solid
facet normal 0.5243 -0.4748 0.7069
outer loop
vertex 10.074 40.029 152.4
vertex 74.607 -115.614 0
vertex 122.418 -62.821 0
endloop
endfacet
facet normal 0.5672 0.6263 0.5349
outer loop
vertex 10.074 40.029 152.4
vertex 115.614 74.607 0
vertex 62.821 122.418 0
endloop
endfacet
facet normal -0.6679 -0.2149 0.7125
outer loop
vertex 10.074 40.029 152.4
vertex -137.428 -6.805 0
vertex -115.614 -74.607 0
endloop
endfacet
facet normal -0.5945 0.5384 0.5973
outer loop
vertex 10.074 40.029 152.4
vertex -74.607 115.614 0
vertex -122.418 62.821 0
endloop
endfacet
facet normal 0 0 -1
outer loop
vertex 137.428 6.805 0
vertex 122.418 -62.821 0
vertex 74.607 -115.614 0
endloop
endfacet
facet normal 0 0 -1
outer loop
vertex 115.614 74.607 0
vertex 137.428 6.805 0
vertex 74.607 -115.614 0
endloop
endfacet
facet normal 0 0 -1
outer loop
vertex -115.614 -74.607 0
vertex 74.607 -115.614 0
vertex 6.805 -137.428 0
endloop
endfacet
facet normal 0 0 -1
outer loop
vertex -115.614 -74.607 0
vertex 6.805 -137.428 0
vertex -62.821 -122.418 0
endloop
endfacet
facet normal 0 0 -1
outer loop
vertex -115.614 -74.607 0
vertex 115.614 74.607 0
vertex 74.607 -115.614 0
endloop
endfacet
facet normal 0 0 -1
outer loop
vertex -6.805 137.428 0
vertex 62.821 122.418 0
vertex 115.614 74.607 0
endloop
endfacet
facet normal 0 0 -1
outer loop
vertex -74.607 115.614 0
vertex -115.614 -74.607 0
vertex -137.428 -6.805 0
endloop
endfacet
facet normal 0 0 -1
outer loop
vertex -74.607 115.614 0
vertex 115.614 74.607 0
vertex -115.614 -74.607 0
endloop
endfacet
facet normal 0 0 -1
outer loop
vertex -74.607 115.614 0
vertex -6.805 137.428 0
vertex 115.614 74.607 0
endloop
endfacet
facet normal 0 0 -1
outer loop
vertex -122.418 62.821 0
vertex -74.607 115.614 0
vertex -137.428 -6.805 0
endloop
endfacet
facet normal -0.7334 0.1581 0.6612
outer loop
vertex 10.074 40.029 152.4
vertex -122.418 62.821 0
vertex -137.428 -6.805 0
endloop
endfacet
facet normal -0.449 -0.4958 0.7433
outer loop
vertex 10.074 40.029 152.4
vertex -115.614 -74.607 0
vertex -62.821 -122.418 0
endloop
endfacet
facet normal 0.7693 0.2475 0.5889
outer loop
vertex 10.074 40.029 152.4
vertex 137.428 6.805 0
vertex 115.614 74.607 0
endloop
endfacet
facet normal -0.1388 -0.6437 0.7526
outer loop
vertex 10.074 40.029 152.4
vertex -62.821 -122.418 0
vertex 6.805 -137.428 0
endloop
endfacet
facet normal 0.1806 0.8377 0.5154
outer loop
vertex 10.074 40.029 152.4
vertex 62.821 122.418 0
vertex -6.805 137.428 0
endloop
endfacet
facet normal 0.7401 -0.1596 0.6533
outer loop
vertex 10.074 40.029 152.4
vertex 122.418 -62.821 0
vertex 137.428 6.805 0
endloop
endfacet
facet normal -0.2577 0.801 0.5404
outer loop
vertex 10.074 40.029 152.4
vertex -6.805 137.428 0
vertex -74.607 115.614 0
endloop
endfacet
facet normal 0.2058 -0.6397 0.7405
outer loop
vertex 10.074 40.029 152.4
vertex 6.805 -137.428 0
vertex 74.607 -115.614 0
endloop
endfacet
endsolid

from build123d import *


with BuildPart() as f3:
    # F0 (on Top) → F3 section 0
    with BuildSketch(Plane.XY, mode=Mode.PRIVATE) as f3_s0:
        Polygon((137.427947, 6.804655), (115.613766, 74.606977), (62.82097, 122.418421), (-6.804655, 137.427947), (-74.606977, 115.613766), (-122.418421, 62.82097), (-137.427947, -6.804655), (-115.613766, -74.606977), (-62.82097, -122.418421), (6.804655, -137.427947), (74.606977, -115.613766), (122.418421, -62.82097), align=None)
    loft([Vertex(10.073566, 40.029168, 152.4), f3_s0.sketch])


solid = f3.part
